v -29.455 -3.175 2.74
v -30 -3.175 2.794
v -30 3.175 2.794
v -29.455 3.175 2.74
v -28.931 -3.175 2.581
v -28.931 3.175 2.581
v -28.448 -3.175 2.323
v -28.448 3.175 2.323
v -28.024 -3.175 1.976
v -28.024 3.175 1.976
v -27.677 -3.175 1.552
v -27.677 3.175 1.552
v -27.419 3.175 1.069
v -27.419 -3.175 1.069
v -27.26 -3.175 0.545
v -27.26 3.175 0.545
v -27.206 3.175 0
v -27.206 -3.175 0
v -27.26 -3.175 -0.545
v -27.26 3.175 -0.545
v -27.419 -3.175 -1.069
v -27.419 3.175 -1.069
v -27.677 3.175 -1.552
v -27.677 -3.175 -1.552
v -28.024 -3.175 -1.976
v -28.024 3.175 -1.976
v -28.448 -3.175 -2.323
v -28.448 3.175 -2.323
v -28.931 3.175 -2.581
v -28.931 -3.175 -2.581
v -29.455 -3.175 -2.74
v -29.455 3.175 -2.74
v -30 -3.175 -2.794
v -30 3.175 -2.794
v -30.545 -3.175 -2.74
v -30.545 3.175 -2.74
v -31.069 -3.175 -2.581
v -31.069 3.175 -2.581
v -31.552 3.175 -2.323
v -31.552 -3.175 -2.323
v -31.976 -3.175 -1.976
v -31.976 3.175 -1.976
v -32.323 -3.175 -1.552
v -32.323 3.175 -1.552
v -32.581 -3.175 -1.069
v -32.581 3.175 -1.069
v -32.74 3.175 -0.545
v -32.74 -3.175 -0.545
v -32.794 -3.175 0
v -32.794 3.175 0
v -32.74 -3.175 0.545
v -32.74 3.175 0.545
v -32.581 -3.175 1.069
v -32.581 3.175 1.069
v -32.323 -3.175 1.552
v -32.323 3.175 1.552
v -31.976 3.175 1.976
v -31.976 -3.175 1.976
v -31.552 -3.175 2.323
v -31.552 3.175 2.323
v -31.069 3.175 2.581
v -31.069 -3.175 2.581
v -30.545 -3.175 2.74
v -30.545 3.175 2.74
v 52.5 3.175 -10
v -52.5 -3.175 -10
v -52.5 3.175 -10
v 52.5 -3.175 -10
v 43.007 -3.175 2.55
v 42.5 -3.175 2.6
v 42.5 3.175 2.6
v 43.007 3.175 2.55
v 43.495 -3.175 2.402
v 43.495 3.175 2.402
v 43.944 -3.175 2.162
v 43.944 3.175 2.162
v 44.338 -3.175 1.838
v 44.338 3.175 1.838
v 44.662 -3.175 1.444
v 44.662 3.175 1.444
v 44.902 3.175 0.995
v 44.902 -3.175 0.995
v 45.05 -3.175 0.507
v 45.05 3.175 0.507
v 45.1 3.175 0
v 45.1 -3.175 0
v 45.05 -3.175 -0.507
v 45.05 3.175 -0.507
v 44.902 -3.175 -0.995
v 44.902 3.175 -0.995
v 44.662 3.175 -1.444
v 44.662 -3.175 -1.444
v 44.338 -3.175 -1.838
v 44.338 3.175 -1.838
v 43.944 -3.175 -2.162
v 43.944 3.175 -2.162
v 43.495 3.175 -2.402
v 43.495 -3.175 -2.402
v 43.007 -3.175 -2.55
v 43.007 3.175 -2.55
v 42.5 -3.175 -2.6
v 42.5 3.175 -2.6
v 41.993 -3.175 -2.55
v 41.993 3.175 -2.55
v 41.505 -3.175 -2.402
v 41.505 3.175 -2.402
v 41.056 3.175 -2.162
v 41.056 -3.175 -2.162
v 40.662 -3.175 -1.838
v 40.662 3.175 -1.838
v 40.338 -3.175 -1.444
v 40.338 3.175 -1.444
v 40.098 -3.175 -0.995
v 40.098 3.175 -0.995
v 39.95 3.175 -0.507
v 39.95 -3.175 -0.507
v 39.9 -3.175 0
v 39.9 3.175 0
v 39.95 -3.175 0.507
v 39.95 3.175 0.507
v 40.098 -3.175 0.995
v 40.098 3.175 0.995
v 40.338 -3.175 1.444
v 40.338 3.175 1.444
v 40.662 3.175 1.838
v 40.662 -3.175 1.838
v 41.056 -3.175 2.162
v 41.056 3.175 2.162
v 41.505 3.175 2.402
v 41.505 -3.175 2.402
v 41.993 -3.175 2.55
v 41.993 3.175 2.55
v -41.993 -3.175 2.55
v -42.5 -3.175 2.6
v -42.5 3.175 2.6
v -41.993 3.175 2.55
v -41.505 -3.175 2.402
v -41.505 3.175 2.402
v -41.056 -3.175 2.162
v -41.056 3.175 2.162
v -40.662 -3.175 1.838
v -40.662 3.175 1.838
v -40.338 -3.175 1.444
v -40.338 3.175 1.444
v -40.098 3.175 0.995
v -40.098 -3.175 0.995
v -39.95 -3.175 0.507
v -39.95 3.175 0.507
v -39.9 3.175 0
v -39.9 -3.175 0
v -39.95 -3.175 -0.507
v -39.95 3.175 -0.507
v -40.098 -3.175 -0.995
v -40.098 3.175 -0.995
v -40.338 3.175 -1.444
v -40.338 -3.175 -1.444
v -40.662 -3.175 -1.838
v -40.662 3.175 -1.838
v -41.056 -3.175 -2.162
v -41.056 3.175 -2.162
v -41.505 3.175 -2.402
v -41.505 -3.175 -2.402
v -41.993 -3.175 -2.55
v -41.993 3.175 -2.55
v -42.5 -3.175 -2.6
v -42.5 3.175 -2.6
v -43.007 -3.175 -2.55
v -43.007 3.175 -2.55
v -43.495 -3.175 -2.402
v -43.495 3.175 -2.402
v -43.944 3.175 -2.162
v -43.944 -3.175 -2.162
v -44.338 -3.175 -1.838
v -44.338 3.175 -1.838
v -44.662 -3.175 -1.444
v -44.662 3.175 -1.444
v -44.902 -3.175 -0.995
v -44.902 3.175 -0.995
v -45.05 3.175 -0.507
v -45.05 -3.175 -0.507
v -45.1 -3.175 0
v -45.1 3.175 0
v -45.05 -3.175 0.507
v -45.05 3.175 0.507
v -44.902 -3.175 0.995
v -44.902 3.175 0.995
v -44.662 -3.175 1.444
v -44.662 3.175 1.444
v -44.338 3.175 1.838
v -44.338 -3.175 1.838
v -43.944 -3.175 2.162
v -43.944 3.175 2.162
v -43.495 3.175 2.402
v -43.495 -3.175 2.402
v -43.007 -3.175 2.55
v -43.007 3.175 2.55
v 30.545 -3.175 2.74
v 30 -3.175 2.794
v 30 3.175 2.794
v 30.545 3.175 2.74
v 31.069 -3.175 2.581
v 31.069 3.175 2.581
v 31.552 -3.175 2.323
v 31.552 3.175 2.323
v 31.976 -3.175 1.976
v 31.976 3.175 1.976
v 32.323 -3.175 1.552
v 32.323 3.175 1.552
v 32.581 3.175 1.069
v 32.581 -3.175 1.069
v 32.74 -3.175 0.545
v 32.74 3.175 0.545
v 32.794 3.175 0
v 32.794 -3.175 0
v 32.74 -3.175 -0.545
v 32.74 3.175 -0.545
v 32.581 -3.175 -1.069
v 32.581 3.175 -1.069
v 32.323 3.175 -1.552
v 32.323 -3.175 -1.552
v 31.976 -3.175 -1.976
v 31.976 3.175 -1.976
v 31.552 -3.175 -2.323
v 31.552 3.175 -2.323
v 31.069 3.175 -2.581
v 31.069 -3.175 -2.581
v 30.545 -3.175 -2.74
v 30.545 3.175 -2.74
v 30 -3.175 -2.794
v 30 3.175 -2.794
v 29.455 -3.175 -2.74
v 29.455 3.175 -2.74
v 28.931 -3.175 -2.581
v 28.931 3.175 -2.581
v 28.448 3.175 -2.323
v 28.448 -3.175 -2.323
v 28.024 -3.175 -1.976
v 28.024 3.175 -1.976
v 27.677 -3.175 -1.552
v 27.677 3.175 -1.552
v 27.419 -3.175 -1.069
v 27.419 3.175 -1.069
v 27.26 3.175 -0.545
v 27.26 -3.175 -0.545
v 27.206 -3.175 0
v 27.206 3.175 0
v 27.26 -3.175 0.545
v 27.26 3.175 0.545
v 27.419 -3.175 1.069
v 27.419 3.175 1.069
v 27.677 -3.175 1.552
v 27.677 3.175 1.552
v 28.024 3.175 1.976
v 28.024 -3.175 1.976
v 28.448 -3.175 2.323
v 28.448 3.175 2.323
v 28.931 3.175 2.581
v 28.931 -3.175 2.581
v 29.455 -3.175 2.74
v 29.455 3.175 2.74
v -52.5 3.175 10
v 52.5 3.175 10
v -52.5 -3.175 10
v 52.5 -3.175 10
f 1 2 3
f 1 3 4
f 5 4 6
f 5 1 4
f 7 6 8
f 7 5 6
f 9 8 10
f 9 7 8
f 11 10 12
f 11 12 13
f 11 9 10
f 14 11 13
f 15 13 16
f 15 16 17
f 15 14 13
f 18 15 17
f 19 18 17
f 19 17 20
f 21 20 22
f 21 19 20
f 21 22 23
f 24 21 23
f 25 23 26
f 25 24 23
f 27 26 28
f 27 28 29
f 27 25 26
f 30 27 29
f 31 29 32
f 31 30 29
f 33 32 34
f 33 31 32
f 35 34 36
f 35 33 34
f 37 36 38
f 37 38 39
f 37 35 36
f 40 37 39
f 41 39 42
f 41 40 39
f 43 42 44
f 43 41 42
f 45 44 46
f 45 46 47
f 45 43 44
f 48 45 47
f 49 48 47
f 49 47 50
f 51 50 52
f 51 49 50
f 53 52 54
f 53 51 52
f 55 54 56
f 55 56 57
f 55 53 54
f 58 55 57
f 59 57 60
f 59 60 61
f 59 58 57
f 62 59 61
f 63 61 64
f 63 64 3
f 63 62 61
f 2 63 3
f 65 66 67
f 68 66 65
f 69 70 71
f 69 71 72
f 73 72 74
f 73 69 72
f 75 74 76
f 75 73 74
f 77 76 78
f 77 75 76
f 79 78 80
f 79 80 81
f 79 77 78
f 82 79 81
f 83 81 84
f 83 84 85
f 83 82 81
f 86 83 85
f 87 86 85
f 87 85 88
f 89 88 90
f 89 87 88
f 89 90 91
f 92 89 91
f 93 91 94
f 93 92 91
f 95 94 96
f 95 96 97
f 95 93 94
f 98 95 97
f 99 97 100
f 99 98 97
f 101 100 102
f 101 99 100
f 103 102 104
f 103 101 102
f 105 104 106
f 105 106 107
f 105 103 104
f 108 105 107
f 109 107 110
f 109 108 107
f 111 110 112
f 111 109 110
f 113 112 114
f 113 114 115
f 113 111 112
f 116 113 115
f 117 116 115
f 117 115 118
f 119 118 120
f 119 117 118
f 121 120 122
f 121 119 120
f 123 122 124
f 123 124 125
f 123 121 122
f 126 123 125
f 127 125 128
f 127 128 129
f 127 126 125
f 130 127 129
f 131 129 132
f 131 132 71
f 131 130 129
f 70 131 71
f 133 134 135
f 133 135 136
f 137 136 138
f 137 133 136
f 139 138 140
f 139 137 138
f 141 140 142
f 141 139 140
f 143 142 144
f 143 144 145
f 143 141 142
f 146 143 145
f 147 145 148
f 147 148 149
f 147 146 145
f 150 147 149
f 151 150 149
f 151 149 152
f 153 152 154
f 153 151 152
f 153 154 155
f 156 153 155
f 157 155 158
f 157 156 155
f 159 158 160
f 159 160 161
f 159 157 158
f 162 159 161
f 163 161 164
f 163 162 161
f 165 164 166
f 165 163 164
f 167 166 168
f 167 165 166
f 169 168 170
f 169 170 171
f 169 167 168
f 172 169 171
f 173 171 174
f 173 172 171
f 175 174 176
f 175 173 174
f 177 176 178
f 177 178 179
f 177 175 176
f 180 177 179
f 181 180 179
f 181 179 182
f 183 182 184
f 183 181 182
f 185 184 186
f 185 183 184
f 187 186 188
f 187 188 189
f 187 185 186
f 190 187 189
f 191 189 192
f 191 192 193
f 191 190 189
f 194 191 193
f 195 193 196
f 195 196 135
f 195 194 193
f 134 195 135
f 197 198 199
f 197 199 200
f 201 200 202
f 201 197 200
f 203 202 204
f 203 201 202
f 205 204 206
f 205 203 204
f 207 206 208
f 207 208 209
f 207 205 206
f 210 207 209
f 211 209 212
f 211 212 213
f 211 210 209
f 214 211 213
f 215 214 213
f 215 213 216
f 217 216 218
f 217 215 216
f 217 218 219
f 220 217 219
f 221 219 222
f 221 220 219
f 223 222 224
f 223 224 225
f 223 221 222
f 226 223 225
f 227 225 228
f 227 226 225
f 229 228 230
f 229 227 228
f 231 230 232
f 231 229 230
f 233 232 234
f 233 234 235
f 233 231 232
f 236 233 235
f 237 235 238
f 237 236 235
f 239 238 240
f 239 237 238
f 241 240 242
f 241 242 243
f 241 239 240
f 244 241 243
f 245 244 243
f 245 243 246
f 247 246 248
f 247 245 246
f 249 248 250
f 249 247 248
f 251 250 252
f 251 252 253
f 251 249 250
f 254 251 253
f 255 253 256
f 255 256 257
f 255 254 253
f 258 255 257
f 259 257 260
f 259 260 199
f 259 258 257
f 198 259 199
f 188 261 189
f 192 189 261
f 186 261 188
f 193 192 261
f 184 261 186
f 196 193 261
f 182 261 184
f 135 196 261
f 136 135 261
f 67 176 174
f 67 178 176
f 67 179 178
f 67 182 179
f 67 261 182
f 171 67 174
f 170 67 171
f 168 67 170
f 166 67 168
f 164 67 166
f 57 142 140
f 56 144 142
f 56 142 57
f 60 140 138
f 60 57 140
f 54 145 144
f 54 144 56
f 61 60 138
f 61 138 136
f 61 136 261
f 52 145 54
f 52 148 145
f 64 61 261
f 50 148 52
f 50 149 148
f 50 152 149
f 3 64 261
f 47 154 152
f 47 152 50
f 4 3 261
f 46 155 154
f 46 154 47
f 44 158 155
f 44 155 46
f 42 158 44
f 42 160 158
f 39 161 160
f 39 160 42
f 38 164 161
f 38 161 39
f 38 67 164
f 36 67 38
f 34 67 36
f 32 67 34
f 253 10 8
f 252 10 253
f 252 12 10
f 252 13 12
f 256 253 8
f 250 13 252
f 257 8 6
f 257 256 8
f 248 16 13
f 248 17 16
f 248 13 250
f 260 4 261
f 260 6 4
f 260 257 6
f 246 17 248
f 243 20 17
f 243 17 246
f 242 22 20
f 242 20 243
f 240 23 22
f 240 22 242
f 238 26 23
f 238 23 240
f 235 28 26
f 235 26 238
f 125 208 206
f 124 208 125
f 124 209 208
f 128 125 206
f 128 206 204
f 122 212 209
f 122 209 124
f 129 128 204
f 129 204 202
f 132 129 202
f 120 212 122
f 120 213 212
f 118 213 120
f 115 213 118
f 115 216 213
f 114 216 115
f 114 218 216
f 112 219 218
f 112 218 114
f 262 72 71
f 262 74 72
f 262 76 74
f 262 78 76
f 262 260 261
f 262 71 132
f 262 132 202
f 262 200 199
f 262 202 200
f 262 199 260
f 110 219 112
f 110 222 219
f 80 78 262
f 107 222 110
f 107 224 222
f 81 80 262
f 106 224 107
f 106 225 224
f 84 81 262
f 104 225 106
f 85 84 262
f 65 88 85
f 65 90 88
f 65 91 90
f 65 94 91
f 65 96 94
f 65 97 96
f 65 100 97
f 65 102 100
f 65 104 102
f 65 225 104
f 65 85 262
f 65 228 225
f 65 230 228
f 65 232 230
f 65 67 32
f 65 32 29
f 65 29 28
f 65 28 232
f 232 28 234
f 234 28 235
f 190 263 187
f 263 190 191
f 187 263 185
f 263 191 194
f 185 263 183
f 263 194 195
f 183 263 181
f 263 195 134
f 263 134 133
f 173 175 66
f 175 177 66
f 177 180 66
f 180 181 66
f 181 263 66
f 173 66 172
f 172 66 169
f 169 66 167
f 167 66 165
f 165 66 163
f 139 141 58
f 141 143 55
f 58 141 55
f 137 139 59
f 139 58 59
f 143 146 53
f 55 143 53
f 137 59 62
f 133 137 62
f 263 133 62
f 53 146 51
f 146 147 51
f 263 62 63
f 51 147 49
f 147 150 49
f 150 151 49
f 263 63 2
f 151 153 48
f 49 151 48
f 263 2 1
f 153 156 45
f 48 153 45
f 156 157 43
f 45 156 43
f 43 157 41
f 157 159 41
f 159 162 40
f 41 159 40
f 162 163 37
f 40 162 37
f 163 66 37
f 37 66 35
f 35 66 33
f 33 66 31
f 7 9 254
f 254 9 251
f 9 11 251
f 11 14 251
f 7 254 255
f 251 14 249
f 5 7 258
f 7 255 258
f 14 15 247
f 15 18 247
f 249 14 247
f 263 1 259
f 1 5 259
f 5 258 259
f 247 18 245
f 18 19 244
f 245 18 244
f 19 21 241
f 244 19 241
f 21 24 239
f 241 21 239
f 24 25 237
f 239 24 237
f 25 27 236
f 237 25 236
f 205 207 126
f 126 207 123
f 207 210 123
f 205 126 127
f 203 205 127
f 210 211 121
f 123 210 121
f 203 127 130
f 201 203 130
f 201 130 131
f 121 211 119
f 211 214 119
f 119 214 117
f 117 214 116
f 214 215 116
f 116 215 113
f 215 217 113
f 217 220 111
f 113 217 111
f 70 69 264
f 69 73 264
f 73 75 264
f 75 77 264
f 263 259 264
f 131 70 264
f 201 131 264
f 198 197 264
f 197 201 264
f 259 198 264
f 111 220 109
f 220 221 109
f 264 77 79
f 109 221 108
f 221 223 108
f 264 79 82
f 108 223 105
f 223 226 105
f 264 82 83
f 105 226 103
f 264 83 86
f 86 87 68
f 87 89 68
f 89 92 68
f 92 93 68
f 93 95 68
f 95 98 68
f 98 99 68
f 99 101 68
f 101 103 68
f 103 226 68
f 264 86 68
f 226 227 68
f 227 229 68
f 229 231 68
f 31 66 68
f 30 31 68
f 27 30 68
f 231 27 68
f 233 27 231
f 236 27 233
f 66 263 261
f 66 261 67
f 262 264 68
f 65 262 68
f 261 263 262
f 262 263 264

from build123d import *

# Parameters (mm, degrees)
BOSS_EXTRUDE1_DEPTH      = 3.175
BOSS_EXTRUDE1_DEPTH_BACK = 3.175
SKETCH1_W                = 105
SKETCH1_H                = 20
SKETCH1_R                = 2.794
SKETCH1_R_2              = 2.6


with BuildPart() as part:
    # Sketch1 → Boss-Extrude1 (new, two sides: drawn at the far end of the back side and taken through both)
    with BuildSketch(Plane(origin=(0, 0, 0), x_dir=(1, 0, 0), z_dir=(0, 1, 0)).offset(-BOSS_EXTRUDE1_DEPTH_BACK)):
        Rectangle(SKETCH1_W, SKETCH1_H)
        with Locations((-30, 0)):
            Circle(SKETCH1_R, mode=Mode.SUBTRACT)
        with Locations((30, 0)):
            Circle(SKETCH1_R, mode=Mode.SUBTRACT)
        with Locations((-42.5, 0)):
            Circle(SKETCH1_R_2, mode=Mode.SUBTRACT)
        with Locations((42.5, 0)):
            Circle(SKETCH1_R_2, mode=Mode.SUBTRACT)
    extrude(amount=BOSS_EXTRUDE1_DEPTH + BOSS_EXTRUDE1_DEPTH_BACK)


solid = part.part
